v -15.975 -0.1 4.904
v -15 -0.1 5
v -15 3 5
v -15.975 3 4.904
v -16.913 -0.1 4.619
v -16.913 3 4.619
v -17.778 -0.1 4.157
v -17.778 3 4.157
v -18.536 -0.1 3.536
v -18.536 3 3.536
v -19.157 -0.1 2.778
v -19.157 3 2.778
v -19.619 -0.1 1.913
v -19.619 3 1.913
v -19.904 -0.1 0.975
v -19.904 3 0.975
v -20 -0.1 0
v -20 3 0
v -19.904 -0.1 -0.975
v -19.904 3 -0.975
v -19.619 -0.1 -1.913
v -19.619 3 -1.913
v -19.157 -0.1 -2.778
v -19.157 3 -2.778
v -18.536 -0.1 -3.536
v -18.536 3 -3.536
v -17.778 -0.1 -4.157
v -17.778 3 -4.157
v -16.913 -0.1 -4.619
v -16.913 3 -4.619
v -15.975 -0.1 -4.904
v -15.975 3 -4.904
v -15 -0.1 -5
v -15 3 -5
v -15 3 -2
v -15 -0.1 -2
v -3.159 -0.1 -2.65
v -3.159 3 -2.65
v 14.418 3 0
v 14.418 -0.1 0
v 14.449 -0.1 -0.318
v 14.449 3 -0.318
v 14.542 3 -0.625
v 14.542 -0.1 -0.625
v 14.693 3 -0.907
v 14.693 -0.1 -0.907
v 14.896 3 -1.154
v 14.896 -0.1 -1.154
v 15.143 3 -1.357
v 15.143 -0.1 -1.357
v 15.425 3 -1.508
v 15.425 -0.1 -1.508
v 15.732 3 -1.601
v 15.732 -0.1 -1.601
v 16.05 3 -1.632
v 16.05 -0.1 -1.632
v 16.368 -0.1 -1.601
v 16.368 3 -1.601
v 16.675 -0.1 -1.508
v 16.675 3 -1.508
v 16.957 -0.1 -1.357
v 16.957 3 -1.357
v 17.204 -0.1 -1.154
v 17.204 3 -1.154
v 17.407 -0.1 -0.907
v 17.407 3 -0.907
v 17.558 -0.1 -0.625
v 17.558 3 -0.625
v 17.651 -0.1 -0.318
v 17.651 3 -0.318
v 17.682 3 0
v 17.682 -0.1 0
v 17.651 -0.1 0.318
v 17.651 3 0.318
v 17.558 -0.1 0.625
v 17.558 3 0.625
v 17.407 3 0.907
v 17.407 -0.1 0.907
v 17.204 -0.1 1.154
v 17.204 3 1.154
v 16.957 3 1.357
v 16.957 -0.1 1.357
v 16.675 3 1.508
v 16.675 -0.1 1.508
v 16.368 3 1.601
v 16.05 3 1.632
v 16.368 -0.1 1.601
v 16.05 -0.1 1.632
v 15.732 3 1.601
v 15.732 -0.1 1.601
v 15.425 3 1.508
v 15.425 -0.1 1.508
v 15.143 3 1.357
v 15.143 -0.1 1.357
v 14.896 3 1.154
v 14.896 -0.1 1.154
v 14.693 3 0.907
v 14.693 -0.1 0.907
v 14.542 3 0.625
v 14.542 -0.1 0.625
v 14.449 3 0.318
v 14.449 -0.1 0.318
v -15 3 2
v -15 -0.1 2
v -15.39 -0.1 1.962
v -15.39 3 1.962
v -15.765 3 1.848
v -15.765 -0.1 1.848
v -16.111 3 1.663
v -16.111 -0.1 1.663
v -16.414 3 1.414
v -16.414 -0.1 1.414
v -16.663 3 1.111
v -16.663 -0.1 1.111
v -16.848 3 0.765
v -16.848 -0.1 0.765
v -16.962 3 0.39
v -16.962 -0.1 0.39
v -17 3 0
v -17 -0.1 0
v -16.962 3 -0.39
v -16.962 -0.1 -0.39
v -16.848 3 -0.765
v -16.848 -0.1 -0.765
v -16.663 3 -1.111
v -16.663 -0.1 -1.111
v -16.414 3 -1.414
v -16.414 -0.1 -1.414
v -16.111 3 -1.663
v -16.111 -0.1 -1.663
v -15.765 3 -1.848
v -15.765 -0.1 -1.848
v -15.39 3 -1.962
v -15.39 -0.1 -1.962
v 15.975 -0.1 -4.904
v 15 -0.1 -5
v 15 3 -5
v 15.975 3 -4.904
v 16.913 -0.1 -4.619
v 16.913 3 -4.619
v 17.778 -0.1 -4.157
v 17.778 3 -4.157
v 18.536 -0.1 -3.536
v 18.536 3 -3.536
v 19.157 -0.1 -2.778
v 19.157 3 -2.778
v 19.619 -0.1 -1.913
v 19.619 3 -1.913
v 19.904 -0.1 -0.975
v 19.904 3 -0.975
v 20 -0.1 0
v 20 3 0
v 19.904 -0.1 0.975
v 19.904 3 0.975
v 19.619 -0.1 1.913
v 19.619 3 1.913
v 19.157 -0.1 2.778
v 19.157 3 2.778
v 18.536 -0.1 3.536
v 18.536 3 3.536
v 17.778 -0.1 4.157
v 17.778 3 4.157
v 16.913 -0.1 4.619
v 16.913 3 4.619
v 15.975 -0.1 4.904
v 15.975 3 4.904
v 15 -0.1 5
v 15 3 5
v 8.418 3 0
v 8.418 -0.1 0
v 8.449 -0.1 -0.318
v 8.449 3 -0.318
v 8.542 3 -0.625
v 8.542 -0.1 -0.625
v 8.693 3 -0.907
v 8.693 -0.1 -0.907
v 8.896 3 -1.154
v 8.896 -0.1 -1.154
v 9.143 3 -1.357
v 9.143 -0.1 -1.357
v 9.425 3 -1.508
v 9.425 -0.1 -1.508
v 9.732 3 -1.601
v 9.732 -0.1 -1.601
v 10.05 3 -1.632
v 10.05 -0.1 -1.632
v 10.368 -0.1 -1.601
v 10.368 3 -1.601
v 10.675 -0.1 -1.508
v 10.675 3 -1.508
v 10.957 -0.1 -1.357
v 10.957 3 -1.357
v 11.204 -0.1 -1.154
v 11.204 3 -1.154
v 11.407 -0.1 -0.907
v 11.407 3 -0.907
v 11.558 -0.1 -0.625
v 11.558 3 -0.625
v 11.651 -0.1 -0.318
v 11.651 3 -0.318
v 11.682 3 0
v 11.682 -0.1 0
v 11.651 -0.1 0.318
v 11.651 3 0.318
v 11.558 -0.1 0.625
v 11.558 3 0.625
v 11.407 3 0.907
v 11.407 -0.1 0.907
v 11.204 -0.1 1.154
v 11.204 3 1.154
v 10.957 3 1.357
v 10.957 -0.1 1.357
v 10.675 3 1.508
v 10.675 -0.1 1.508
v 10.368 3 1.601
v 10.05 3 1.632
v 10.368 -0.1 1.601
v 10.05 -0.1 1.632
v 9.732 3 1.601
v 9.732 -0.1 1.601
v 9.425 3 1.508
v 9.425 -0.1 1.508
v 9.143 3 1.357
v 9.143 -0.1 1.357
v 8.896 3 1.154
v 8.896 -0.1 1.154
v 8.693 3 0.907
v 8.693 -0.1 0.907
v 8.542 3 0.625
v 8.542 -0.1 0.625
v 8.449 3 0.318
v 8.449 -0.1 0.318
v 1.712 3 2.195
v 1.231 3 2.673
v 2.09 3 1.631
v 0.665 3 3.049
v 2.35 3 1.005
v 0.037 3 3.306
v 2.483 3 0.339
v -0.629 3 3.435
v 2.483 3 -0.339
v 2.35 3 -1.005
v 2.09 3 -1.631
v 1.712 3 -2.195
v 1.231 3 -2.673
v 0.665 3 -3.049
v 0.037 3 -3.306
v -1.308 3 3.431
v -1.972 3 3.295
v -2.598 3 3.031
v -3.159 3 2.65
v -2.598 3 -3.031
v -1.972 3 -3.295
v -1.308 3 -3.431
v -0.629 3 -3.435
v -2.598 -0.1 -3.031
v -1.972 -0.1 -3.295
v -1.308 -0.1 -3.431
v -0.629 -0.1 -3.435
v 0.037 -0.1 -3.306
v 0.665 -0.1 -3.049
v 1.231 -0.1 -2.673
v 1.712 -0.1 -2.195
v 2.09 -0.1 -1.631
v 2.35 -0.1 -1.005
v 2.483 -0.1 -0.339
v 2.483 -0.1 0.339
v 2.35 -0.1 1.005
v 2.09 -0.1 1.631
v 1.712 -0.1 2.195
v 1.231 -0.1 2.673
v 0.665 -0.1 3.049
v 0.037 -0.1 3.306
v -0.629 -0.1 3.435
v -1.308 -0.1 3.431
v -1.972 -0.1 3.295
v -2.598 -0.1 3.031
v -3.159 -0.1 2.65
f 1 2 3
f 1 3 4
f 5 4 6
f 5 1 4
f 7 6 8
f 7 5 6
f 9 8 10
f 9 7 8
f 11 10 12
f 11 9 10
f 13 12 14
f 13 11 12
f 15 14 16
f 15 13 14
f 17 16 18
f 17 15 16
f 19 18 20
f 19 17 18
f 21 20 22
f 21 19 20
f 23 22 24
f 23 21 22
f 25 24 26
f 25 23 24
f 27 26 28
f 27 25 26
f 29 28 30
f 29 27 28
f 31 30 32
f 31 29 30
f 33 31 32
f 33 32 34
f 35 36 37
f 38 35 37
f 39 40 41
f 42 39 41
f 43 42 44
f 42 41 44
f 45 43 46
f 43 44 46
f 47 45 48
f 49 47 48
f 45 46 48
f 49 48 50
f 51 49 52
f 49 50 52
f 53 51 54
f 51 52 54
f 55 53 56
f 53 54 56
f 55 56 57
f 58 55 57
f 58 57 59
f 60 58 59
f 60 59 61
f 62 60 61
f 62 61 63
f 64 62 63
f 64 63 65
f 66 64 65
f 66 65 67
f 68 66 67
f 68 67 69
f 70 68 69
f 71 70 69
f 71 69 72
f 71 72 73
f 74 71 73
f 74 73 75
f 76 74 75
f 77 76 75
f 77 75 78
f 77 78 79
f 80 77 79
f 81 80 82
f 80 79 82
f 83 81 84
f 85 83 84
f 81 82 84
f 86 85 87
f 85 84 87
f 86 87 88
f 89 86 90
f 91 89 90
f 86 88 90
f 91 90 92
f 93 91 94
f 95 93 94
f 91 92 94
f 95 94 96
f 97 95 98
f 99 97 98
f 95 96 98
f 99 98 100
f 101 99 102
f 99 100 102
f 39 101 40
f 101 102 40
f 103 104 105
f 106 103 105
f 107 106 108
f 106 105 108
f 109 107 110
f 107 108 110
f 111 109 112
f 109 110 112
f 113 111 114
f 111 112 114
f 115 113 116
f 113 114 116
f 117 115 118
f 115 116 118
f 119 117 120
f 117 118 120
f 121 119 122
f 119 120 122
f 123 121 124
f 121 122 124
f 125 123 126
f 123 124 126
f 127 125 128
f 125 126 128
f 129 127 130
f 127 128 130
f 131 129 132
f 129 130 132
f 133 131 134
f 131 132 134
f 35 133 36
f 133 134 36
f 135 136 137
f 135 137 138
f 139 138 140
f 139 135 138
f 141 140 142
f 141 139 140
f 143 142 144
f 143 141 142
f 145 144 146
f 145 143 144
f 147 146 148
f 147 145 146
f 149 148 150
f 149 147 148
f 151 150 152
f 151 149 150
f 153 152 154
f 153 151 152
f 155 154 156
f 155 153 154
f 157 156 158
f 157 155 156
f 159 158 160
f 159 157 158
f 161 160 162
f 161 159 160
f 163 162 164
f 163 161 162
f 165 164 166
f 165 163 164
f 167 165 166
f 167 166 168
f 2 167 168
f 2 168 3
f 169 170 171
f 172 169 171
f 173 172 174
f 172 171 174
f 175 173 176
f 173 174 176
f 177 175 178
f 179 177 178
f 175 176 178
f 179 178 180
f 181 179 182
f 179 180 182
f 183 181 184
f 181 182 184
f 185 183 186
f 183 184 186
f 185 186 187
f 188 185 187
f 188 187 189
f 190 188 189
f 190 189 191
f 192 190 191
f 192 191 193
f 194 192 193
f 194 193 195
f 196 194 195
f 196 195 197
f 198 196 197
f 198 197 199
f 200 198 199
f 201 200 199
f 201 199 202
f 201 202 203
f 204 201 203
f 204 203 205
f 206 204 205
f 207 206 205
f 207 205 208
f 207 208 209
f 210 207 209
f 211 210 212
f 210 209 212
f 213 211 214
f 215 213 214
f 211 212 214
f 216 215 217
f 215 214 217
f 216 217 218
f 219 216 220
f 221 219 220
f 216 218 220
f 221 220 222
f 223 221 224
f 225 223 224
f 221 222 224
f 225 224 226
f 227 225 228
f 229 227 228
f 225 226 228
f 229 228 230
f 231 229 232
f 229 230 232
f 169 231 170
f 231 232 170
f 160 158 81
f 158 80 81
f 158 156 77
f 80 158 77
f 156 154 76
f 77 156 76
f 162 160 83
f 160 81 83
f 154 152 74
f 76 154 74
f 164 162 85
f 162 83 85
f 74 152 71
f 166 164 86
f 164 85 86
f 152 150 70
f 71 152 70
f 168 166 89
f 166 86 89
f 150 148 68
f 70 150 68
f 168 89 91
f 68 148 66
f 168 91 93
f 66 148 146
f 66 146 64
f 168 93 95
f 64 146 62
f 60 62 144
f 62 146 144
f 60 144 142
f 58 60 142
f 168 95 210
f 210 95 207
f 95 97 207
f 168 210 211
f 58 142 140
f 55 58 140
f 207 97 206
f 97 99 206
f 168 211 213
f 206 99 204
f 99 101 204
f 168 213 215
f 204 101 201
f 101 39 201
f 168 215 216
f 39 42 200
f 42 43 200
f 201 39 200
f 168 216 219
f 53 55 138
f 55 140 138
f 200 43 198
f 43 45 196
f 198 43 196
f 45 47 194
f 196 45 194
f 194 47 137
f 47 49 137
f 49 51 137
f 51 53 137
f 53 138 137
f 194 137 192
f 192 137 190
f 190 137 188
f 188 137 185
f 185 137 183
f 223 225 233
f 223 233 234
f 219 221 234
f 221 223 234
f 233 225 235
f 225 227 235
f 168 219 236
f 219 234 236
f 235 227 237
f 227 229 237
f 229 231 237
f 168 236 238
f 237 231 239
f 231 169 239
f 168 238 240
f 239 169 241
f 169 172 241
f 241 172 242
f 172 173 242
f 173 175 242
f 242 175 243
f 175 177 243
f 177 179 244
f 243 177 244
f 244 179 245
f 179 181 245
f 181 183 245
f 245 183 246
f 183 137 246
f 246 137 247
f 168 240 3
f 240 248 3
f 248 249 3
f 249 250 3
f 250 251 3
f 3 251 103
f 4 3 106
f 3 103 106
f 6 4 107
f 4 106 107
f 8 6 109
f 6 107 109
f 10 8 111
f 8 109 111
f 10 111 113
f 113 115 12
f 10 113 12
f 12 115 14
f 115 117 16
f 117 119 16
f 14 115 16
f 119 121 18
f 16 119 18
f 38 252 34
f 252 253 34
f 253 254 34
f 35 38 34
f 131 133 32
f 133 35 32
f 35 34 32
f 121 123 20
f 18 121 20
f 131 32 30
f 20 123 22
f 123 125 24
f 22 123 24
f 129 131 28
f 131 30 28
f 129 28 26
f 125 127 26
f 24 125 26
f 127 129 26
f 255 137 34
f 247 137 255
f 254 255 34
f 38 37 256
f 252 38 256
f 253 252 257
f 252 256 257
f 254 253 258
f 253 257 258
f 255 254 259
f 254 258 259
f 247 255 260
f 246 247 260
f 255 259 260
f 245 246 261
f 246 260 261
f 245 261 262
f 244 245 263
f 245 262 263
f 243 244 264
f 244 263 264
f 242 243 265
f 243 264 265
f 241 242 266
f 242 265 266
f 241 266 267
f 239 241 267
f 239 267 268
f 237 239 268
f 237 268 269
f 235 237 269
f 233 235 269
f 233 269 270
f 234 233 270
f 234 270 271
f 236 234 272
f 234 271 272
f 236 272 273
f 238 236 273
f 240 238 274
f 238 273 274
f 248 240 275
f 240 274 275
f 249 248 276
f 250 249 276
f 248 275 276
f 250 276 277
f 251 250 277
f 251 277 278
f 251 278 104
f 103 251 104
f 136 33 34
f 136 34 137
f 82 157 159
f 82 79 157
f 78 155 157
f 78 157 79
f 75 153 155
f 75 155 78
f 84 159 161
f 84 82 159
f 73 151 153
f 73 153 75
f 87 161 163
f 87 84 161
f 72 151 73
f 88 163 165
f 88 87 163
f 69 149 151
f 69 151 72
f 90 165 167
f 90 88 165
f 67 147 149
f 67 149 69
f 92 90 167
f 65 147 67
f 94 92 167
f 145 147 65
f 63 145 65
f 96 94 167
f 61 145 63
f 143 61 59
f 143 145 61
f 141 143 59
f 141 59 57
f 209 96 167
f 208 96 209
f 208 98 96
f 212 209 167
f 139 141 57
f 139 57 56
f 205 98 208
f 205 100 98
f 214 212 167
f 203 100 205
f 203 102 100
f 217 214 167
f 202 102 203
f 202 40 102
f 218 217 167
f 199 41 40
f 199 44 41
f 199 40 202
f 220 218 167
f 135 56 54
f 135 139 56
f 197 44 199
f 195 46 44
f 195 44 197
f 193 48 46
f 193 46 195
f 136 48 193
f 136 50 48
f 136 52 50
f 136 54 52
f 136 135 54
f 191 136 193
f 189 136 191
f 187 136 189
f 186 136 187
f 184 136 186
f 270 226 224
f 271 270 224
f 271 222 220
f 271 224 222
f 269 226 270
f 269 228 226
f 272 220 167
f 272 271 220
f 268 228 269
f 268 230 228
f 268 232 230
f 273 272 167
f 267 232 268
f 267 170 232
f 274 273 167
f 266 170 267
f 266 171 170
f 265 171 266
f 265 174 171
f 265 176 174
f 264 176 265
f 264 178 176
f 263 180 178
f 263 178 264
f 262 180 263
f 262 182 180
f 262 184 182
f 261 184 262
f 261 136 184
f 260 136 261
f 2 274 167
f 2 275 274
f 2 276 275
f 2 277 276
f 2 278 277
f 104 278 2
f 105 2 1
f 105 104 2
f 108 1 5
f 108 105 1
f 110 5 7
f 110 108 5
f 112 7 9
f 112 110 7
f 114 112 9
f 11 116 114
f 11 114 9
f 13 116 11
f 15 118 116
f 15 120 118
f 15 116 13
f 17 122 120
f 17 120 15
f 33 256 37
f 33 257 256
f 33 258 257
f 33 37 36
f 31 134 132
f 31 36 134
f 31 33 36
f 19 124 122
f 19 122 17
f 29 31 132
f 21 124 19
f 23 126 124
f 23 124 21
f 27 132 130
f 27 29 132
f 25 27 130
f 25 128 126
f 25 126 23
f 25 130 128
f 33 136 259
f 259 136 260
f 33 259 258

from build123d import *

# Parameters (mm, degrees)
BOSS_EXTRUDE1_DEPTH      = 3
BOSS_EXTRUDE1_DEPTH_BACK = 0.1
F_4_CLEARANCE_HOLE1_D    = 3.2639


with BuildPart() as part:
    # Sketch1 → Boss-Extrude1 (new, two sides: drawn at the far end of the back side and taken through both)
    with BuildSketch(Plane(origin=(0, 0, 0), x_dir=(1, 0, 0), z_dir=(0, 1, 0)).offset(-BOSS_EXTRUDE1_DEPTH_BACK)):
        with BuildLine():
            Line((-15, 5), (15, 5))
            ThreePointArc((15, 5), (20, 0), (15, -5))
            Line((15, -5), (-15, -5))
            ThreePointArc((-15, -5), (-20, 0), (-15, 5))
        make_face()
        with BuildLine():
            Line((-15, 2), (-3.159072307, 2.649999913))
            ThreePointArc((-3.159072307, 2.649999913), (2.5, 0), (-3.159072307, -2.649999913))
            Line((-3.159072307, -2.649999913), (-15, -2))
            ThreePointArc((-15, -2), (-17, 0), (-15, 2))
        make_face(mode=Mode.SUBTRACT)
    extrude(amount=BOSS_EXTRUDE1_DEPTH + BOSS_EXTRUDE1_DEPTH_BACK)

    # #4 Clearance Hole1 (through all)
    with Locations(Plane(origin=(0, 3, 0), x_dir=(1, 0, 0), z_dir=(0, 1, 0))):
        with Locations((10.05, 0), (16.05, 0)):
            Hole(F_4_CLEARANCE_HOLE1_D / 2)


solid = part.part
